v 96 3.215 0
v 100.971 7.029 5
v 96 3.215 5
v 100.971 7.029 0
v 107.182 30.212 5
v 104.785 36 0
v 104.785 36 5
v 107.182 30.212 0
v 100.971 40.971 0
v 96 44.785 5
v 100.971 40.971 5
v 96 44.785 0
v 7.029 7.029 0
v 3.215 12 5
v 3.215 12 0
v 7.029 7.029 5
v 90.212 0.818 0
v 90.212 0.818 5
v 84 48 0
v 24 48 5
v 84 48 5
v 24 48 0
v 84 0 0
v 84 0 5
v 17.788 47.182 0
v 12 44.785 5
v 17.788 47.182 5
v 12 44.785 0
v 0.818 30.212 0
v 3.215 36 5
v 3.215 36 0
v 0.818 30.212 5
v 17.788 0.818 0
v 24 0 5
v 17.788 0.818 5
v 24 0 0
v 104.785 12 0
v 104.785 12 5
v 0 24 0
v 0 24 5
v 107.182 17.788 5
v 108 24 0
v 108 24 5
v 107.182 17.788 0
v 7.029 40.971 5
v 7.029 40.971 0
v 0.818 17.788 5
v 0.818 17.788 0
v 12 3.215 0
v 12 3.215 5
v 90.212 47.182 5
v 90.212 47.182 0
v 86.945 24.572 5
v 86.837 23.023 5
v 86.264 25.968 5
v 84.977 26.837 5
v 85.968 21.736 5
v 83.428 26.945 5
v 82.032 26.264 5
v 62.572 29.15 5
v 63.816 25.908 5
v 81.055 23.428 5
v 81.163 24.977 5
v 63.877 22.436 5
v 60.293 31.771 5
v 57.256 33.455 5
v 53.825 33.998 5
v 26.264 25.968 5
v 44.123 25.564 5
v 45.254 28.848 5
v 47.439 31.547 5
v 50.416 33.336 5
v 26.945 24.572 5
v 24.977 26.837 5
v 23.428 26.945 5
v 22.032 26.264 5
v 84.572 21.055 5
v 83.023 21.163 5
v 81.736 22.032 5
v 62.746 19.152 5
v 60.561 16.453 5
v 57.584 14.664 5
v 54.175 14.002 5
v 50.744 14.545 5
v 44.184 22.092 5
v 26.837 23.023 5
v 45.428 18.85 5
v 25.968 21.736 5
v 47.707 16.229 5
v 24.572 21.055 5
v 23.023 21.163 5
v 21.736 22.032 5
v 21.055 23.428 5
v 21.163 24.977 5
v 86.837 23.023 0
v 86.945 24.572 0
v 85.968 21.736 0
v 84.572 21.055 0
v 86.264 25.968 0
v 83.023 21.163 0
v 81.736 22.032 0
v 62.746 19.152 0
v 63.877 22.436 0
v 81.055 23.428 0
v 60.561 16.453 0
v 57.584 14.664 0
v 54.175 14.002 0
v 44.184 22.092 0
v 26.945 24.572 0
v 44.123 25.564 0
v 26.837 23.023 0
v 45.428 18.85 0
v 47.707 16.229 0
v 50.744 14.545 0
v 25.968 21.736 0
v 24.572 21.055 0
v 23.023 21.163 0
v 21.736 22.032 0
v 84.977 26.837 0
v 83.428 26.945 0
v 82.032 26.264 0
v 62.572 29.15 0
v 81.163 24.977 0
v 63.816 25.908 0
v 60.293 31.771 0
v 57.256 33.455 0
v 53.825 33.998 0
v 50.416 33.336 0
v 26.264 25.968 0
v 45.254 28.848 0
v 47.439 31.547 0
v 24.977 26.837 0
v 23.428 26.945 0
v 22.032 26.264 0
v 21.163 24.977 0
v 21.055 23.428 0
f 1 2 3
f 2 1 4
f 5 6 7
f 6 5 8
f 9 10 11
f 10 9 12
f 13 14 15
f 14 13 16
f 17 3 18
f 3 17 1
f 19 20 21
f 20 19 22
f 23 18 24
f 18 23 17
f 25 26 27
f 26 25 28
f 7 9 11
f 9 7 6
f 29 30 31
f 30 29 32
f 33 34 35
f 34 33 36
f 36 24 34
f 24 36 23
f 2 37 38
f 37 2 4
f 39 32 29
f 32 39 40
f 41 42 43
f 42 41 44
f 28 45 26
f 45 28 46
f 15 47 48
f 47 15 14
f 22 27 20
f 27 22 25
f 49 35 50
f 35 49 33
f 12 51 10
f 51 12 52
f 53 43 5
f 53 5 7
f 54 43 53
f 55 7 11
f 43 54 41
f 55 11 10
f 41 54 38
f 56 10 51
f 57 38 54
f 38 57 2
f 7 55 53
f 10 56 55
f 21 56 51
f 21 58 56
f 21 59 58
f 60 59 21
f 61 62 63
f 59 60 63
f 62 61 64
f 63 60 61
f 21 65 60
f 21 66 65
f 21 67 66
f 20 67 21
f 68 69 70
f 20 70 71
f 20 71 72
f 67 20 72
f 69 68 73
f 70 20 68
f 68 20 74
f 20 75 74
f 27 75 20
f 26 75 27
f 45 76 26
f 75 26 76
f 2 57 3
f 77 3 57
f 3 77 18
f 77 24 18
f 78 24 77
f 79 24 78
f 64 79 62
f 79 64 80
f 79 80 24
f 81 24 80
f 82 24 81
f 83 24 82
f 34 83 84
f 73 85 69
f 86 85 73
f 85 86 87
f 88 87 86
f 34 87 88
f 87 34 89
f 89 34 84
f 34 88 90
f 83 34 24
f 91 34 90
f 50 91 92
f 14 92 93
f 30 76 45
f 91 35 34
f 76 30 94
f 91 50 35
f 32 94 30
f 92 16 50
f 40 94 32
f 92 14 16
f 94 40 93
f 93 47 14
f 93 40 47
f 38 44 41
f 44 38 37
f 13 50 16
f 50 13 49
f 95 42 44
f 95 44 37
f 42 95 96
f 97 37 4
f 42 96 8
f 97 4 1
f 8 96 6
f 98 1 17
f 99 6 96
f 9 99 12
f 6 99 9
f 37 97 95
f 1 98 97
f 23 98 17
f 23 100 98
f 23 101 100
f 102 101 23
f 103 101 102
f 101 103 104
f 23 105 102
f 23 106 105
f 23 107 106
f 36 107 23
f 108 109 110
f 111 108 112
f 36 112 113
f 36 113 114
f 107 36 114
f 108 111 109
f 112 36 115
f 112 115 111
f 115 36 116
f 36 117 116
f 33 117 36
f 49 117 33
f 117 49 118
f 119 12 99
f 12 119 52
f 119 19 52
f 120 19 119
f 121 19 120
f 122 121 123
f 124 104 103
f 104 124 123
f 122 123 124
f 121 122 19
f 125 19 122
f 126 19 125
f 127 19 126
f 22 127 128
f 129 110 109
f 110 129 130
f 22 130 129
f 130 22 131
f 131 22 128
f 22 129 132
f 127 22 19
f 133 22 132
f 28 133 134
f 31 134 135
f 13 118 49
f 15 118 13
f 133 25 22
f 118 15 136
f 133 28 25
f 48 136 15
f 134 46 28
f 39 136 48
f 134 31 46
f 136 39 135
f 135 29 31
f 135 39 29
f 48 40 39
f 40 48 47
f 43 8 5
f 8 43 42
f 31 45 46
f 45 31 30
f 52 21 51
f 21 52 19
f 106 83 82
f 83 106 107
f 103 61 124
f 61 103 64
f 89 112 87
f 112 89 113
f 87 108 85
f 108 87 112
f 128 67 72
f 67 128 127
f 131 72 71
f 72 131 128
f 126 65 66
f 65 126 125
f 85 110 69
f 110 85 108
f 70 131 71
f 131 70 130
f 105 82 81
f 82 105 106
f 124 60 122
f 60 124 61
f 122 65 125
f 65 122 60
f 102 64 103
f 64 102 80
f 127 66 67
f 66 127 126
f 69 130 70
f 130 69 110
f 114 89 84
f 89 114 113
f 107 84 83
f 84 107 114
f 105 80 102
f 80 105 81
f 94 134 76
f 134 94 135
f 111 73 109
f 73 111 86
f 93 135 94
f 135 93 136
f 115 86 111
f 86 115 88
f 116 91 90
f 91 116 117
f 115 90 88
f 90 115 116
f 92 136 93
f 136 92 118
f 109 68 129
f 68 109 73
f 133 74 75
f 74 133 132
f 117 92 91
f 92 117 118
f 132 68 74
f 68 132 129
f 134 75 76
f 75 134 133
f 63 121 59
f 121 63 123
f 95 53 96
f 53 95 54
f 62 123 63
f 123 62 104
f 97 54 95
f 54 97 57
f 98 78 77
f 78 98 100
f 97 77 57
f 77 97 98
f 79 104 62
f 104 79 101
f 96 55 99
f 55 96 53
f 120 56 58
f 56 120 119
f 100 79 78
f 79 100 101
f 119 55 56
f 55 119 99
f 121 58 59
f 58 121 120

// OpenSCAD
$fn = 32;

// ----------------------------------------------------------------------
// Spacer plate: obround span 60, caps R24
// ----------------------------------------------------------------------

// --- parameters (mm) ---
bore_r = 10;              // centre bore radius
bolt_r = 3;               // bolt hole radius
plate_t = 5;              // plate thickness, Z (extrusion height)
span = 60;                // obround span
cap_r = 24;               // cap radius
fit_tol = 0.05;           // declared fit tolerance (prompt contract)
free_tol = 0.2;           // declared free tolerance (prompt contract)

profile = [[24, 48], [17.788, 47.182], [12, 44.785], [7.029, 40.971], [3.215, 36], [0.818, 30.212], [0, 24], [0.818, 17.788], [3.215, 12], [7.029, 7.029], [12, 3.215], [17.788, 0.818], [24, 0], [84, 0], [90.212, 0.818], [96, 3.215], [100.971, 7.029], [104.785, 12], [107.182, 17.788], [108, 24], [107.182, 30.212], [104.785, 36], [100.971, 40.971], [96, 44.785], [90.212, 47.182], [84, 48]];  // primary outline, 26 points, counter clockwise
void_1 = [[63.816, 25.908], [62.572, 29.15], [60.293, 31.771], [57.256, 33.455], [53.825, 33.998], [50.416, 33.336], [47.439, 31.547], [45.254, 28.848], [44.123, 25.564], [44.184, 22.092], [45.428, 18.85], [47.707, 16.229], [50.744, 14.545], [54.175, 14.002], [57.584, 14.664], [60.561, 16.453], [62.746, 19.152], [63.877, 22.436]];  // centre bore, 18 points
void_2 = [[26.945, 24.572], [26.264, 25.968], [24.977, 26.837], [23.428, 26.945], [22.032, 26.264], [21.163, 24.977], [21.055, 23.428], [21.736, 22.032], [23.023, 21.163], [24.572, 21.055], [25.968, 21.736], [26.837, 23.023]];  // end hole, 12 points
void_3 = [[86.945, 24.572], [86.264, 25.968], [84.977, 26.837], [83.428, 26.945], [82.032, 26.264], [81.163, 24.977], [81.055, 23.428], [81.736, 22.032], [83.023, 21.163], [84.572, 21.055], [85.968, 21.736], [86.837, 23.023]];  // end hole, 12 points

// --- the one profile operation ---
difference() {
  linear_extrude(height = plate_t) polygon(points = profile);
  translate([0, 0, -1])
    linear_extrude(height = plate_t + 2) polygon(points = void_1);
  translate([0, 0, -1])
    linear_extrude(height = plate_t + 2) polygon(points = void_2);
  translate([0, 0, -1])
    linear_extrude(height = plate_t + 2) polygon(points = void_3);
}
